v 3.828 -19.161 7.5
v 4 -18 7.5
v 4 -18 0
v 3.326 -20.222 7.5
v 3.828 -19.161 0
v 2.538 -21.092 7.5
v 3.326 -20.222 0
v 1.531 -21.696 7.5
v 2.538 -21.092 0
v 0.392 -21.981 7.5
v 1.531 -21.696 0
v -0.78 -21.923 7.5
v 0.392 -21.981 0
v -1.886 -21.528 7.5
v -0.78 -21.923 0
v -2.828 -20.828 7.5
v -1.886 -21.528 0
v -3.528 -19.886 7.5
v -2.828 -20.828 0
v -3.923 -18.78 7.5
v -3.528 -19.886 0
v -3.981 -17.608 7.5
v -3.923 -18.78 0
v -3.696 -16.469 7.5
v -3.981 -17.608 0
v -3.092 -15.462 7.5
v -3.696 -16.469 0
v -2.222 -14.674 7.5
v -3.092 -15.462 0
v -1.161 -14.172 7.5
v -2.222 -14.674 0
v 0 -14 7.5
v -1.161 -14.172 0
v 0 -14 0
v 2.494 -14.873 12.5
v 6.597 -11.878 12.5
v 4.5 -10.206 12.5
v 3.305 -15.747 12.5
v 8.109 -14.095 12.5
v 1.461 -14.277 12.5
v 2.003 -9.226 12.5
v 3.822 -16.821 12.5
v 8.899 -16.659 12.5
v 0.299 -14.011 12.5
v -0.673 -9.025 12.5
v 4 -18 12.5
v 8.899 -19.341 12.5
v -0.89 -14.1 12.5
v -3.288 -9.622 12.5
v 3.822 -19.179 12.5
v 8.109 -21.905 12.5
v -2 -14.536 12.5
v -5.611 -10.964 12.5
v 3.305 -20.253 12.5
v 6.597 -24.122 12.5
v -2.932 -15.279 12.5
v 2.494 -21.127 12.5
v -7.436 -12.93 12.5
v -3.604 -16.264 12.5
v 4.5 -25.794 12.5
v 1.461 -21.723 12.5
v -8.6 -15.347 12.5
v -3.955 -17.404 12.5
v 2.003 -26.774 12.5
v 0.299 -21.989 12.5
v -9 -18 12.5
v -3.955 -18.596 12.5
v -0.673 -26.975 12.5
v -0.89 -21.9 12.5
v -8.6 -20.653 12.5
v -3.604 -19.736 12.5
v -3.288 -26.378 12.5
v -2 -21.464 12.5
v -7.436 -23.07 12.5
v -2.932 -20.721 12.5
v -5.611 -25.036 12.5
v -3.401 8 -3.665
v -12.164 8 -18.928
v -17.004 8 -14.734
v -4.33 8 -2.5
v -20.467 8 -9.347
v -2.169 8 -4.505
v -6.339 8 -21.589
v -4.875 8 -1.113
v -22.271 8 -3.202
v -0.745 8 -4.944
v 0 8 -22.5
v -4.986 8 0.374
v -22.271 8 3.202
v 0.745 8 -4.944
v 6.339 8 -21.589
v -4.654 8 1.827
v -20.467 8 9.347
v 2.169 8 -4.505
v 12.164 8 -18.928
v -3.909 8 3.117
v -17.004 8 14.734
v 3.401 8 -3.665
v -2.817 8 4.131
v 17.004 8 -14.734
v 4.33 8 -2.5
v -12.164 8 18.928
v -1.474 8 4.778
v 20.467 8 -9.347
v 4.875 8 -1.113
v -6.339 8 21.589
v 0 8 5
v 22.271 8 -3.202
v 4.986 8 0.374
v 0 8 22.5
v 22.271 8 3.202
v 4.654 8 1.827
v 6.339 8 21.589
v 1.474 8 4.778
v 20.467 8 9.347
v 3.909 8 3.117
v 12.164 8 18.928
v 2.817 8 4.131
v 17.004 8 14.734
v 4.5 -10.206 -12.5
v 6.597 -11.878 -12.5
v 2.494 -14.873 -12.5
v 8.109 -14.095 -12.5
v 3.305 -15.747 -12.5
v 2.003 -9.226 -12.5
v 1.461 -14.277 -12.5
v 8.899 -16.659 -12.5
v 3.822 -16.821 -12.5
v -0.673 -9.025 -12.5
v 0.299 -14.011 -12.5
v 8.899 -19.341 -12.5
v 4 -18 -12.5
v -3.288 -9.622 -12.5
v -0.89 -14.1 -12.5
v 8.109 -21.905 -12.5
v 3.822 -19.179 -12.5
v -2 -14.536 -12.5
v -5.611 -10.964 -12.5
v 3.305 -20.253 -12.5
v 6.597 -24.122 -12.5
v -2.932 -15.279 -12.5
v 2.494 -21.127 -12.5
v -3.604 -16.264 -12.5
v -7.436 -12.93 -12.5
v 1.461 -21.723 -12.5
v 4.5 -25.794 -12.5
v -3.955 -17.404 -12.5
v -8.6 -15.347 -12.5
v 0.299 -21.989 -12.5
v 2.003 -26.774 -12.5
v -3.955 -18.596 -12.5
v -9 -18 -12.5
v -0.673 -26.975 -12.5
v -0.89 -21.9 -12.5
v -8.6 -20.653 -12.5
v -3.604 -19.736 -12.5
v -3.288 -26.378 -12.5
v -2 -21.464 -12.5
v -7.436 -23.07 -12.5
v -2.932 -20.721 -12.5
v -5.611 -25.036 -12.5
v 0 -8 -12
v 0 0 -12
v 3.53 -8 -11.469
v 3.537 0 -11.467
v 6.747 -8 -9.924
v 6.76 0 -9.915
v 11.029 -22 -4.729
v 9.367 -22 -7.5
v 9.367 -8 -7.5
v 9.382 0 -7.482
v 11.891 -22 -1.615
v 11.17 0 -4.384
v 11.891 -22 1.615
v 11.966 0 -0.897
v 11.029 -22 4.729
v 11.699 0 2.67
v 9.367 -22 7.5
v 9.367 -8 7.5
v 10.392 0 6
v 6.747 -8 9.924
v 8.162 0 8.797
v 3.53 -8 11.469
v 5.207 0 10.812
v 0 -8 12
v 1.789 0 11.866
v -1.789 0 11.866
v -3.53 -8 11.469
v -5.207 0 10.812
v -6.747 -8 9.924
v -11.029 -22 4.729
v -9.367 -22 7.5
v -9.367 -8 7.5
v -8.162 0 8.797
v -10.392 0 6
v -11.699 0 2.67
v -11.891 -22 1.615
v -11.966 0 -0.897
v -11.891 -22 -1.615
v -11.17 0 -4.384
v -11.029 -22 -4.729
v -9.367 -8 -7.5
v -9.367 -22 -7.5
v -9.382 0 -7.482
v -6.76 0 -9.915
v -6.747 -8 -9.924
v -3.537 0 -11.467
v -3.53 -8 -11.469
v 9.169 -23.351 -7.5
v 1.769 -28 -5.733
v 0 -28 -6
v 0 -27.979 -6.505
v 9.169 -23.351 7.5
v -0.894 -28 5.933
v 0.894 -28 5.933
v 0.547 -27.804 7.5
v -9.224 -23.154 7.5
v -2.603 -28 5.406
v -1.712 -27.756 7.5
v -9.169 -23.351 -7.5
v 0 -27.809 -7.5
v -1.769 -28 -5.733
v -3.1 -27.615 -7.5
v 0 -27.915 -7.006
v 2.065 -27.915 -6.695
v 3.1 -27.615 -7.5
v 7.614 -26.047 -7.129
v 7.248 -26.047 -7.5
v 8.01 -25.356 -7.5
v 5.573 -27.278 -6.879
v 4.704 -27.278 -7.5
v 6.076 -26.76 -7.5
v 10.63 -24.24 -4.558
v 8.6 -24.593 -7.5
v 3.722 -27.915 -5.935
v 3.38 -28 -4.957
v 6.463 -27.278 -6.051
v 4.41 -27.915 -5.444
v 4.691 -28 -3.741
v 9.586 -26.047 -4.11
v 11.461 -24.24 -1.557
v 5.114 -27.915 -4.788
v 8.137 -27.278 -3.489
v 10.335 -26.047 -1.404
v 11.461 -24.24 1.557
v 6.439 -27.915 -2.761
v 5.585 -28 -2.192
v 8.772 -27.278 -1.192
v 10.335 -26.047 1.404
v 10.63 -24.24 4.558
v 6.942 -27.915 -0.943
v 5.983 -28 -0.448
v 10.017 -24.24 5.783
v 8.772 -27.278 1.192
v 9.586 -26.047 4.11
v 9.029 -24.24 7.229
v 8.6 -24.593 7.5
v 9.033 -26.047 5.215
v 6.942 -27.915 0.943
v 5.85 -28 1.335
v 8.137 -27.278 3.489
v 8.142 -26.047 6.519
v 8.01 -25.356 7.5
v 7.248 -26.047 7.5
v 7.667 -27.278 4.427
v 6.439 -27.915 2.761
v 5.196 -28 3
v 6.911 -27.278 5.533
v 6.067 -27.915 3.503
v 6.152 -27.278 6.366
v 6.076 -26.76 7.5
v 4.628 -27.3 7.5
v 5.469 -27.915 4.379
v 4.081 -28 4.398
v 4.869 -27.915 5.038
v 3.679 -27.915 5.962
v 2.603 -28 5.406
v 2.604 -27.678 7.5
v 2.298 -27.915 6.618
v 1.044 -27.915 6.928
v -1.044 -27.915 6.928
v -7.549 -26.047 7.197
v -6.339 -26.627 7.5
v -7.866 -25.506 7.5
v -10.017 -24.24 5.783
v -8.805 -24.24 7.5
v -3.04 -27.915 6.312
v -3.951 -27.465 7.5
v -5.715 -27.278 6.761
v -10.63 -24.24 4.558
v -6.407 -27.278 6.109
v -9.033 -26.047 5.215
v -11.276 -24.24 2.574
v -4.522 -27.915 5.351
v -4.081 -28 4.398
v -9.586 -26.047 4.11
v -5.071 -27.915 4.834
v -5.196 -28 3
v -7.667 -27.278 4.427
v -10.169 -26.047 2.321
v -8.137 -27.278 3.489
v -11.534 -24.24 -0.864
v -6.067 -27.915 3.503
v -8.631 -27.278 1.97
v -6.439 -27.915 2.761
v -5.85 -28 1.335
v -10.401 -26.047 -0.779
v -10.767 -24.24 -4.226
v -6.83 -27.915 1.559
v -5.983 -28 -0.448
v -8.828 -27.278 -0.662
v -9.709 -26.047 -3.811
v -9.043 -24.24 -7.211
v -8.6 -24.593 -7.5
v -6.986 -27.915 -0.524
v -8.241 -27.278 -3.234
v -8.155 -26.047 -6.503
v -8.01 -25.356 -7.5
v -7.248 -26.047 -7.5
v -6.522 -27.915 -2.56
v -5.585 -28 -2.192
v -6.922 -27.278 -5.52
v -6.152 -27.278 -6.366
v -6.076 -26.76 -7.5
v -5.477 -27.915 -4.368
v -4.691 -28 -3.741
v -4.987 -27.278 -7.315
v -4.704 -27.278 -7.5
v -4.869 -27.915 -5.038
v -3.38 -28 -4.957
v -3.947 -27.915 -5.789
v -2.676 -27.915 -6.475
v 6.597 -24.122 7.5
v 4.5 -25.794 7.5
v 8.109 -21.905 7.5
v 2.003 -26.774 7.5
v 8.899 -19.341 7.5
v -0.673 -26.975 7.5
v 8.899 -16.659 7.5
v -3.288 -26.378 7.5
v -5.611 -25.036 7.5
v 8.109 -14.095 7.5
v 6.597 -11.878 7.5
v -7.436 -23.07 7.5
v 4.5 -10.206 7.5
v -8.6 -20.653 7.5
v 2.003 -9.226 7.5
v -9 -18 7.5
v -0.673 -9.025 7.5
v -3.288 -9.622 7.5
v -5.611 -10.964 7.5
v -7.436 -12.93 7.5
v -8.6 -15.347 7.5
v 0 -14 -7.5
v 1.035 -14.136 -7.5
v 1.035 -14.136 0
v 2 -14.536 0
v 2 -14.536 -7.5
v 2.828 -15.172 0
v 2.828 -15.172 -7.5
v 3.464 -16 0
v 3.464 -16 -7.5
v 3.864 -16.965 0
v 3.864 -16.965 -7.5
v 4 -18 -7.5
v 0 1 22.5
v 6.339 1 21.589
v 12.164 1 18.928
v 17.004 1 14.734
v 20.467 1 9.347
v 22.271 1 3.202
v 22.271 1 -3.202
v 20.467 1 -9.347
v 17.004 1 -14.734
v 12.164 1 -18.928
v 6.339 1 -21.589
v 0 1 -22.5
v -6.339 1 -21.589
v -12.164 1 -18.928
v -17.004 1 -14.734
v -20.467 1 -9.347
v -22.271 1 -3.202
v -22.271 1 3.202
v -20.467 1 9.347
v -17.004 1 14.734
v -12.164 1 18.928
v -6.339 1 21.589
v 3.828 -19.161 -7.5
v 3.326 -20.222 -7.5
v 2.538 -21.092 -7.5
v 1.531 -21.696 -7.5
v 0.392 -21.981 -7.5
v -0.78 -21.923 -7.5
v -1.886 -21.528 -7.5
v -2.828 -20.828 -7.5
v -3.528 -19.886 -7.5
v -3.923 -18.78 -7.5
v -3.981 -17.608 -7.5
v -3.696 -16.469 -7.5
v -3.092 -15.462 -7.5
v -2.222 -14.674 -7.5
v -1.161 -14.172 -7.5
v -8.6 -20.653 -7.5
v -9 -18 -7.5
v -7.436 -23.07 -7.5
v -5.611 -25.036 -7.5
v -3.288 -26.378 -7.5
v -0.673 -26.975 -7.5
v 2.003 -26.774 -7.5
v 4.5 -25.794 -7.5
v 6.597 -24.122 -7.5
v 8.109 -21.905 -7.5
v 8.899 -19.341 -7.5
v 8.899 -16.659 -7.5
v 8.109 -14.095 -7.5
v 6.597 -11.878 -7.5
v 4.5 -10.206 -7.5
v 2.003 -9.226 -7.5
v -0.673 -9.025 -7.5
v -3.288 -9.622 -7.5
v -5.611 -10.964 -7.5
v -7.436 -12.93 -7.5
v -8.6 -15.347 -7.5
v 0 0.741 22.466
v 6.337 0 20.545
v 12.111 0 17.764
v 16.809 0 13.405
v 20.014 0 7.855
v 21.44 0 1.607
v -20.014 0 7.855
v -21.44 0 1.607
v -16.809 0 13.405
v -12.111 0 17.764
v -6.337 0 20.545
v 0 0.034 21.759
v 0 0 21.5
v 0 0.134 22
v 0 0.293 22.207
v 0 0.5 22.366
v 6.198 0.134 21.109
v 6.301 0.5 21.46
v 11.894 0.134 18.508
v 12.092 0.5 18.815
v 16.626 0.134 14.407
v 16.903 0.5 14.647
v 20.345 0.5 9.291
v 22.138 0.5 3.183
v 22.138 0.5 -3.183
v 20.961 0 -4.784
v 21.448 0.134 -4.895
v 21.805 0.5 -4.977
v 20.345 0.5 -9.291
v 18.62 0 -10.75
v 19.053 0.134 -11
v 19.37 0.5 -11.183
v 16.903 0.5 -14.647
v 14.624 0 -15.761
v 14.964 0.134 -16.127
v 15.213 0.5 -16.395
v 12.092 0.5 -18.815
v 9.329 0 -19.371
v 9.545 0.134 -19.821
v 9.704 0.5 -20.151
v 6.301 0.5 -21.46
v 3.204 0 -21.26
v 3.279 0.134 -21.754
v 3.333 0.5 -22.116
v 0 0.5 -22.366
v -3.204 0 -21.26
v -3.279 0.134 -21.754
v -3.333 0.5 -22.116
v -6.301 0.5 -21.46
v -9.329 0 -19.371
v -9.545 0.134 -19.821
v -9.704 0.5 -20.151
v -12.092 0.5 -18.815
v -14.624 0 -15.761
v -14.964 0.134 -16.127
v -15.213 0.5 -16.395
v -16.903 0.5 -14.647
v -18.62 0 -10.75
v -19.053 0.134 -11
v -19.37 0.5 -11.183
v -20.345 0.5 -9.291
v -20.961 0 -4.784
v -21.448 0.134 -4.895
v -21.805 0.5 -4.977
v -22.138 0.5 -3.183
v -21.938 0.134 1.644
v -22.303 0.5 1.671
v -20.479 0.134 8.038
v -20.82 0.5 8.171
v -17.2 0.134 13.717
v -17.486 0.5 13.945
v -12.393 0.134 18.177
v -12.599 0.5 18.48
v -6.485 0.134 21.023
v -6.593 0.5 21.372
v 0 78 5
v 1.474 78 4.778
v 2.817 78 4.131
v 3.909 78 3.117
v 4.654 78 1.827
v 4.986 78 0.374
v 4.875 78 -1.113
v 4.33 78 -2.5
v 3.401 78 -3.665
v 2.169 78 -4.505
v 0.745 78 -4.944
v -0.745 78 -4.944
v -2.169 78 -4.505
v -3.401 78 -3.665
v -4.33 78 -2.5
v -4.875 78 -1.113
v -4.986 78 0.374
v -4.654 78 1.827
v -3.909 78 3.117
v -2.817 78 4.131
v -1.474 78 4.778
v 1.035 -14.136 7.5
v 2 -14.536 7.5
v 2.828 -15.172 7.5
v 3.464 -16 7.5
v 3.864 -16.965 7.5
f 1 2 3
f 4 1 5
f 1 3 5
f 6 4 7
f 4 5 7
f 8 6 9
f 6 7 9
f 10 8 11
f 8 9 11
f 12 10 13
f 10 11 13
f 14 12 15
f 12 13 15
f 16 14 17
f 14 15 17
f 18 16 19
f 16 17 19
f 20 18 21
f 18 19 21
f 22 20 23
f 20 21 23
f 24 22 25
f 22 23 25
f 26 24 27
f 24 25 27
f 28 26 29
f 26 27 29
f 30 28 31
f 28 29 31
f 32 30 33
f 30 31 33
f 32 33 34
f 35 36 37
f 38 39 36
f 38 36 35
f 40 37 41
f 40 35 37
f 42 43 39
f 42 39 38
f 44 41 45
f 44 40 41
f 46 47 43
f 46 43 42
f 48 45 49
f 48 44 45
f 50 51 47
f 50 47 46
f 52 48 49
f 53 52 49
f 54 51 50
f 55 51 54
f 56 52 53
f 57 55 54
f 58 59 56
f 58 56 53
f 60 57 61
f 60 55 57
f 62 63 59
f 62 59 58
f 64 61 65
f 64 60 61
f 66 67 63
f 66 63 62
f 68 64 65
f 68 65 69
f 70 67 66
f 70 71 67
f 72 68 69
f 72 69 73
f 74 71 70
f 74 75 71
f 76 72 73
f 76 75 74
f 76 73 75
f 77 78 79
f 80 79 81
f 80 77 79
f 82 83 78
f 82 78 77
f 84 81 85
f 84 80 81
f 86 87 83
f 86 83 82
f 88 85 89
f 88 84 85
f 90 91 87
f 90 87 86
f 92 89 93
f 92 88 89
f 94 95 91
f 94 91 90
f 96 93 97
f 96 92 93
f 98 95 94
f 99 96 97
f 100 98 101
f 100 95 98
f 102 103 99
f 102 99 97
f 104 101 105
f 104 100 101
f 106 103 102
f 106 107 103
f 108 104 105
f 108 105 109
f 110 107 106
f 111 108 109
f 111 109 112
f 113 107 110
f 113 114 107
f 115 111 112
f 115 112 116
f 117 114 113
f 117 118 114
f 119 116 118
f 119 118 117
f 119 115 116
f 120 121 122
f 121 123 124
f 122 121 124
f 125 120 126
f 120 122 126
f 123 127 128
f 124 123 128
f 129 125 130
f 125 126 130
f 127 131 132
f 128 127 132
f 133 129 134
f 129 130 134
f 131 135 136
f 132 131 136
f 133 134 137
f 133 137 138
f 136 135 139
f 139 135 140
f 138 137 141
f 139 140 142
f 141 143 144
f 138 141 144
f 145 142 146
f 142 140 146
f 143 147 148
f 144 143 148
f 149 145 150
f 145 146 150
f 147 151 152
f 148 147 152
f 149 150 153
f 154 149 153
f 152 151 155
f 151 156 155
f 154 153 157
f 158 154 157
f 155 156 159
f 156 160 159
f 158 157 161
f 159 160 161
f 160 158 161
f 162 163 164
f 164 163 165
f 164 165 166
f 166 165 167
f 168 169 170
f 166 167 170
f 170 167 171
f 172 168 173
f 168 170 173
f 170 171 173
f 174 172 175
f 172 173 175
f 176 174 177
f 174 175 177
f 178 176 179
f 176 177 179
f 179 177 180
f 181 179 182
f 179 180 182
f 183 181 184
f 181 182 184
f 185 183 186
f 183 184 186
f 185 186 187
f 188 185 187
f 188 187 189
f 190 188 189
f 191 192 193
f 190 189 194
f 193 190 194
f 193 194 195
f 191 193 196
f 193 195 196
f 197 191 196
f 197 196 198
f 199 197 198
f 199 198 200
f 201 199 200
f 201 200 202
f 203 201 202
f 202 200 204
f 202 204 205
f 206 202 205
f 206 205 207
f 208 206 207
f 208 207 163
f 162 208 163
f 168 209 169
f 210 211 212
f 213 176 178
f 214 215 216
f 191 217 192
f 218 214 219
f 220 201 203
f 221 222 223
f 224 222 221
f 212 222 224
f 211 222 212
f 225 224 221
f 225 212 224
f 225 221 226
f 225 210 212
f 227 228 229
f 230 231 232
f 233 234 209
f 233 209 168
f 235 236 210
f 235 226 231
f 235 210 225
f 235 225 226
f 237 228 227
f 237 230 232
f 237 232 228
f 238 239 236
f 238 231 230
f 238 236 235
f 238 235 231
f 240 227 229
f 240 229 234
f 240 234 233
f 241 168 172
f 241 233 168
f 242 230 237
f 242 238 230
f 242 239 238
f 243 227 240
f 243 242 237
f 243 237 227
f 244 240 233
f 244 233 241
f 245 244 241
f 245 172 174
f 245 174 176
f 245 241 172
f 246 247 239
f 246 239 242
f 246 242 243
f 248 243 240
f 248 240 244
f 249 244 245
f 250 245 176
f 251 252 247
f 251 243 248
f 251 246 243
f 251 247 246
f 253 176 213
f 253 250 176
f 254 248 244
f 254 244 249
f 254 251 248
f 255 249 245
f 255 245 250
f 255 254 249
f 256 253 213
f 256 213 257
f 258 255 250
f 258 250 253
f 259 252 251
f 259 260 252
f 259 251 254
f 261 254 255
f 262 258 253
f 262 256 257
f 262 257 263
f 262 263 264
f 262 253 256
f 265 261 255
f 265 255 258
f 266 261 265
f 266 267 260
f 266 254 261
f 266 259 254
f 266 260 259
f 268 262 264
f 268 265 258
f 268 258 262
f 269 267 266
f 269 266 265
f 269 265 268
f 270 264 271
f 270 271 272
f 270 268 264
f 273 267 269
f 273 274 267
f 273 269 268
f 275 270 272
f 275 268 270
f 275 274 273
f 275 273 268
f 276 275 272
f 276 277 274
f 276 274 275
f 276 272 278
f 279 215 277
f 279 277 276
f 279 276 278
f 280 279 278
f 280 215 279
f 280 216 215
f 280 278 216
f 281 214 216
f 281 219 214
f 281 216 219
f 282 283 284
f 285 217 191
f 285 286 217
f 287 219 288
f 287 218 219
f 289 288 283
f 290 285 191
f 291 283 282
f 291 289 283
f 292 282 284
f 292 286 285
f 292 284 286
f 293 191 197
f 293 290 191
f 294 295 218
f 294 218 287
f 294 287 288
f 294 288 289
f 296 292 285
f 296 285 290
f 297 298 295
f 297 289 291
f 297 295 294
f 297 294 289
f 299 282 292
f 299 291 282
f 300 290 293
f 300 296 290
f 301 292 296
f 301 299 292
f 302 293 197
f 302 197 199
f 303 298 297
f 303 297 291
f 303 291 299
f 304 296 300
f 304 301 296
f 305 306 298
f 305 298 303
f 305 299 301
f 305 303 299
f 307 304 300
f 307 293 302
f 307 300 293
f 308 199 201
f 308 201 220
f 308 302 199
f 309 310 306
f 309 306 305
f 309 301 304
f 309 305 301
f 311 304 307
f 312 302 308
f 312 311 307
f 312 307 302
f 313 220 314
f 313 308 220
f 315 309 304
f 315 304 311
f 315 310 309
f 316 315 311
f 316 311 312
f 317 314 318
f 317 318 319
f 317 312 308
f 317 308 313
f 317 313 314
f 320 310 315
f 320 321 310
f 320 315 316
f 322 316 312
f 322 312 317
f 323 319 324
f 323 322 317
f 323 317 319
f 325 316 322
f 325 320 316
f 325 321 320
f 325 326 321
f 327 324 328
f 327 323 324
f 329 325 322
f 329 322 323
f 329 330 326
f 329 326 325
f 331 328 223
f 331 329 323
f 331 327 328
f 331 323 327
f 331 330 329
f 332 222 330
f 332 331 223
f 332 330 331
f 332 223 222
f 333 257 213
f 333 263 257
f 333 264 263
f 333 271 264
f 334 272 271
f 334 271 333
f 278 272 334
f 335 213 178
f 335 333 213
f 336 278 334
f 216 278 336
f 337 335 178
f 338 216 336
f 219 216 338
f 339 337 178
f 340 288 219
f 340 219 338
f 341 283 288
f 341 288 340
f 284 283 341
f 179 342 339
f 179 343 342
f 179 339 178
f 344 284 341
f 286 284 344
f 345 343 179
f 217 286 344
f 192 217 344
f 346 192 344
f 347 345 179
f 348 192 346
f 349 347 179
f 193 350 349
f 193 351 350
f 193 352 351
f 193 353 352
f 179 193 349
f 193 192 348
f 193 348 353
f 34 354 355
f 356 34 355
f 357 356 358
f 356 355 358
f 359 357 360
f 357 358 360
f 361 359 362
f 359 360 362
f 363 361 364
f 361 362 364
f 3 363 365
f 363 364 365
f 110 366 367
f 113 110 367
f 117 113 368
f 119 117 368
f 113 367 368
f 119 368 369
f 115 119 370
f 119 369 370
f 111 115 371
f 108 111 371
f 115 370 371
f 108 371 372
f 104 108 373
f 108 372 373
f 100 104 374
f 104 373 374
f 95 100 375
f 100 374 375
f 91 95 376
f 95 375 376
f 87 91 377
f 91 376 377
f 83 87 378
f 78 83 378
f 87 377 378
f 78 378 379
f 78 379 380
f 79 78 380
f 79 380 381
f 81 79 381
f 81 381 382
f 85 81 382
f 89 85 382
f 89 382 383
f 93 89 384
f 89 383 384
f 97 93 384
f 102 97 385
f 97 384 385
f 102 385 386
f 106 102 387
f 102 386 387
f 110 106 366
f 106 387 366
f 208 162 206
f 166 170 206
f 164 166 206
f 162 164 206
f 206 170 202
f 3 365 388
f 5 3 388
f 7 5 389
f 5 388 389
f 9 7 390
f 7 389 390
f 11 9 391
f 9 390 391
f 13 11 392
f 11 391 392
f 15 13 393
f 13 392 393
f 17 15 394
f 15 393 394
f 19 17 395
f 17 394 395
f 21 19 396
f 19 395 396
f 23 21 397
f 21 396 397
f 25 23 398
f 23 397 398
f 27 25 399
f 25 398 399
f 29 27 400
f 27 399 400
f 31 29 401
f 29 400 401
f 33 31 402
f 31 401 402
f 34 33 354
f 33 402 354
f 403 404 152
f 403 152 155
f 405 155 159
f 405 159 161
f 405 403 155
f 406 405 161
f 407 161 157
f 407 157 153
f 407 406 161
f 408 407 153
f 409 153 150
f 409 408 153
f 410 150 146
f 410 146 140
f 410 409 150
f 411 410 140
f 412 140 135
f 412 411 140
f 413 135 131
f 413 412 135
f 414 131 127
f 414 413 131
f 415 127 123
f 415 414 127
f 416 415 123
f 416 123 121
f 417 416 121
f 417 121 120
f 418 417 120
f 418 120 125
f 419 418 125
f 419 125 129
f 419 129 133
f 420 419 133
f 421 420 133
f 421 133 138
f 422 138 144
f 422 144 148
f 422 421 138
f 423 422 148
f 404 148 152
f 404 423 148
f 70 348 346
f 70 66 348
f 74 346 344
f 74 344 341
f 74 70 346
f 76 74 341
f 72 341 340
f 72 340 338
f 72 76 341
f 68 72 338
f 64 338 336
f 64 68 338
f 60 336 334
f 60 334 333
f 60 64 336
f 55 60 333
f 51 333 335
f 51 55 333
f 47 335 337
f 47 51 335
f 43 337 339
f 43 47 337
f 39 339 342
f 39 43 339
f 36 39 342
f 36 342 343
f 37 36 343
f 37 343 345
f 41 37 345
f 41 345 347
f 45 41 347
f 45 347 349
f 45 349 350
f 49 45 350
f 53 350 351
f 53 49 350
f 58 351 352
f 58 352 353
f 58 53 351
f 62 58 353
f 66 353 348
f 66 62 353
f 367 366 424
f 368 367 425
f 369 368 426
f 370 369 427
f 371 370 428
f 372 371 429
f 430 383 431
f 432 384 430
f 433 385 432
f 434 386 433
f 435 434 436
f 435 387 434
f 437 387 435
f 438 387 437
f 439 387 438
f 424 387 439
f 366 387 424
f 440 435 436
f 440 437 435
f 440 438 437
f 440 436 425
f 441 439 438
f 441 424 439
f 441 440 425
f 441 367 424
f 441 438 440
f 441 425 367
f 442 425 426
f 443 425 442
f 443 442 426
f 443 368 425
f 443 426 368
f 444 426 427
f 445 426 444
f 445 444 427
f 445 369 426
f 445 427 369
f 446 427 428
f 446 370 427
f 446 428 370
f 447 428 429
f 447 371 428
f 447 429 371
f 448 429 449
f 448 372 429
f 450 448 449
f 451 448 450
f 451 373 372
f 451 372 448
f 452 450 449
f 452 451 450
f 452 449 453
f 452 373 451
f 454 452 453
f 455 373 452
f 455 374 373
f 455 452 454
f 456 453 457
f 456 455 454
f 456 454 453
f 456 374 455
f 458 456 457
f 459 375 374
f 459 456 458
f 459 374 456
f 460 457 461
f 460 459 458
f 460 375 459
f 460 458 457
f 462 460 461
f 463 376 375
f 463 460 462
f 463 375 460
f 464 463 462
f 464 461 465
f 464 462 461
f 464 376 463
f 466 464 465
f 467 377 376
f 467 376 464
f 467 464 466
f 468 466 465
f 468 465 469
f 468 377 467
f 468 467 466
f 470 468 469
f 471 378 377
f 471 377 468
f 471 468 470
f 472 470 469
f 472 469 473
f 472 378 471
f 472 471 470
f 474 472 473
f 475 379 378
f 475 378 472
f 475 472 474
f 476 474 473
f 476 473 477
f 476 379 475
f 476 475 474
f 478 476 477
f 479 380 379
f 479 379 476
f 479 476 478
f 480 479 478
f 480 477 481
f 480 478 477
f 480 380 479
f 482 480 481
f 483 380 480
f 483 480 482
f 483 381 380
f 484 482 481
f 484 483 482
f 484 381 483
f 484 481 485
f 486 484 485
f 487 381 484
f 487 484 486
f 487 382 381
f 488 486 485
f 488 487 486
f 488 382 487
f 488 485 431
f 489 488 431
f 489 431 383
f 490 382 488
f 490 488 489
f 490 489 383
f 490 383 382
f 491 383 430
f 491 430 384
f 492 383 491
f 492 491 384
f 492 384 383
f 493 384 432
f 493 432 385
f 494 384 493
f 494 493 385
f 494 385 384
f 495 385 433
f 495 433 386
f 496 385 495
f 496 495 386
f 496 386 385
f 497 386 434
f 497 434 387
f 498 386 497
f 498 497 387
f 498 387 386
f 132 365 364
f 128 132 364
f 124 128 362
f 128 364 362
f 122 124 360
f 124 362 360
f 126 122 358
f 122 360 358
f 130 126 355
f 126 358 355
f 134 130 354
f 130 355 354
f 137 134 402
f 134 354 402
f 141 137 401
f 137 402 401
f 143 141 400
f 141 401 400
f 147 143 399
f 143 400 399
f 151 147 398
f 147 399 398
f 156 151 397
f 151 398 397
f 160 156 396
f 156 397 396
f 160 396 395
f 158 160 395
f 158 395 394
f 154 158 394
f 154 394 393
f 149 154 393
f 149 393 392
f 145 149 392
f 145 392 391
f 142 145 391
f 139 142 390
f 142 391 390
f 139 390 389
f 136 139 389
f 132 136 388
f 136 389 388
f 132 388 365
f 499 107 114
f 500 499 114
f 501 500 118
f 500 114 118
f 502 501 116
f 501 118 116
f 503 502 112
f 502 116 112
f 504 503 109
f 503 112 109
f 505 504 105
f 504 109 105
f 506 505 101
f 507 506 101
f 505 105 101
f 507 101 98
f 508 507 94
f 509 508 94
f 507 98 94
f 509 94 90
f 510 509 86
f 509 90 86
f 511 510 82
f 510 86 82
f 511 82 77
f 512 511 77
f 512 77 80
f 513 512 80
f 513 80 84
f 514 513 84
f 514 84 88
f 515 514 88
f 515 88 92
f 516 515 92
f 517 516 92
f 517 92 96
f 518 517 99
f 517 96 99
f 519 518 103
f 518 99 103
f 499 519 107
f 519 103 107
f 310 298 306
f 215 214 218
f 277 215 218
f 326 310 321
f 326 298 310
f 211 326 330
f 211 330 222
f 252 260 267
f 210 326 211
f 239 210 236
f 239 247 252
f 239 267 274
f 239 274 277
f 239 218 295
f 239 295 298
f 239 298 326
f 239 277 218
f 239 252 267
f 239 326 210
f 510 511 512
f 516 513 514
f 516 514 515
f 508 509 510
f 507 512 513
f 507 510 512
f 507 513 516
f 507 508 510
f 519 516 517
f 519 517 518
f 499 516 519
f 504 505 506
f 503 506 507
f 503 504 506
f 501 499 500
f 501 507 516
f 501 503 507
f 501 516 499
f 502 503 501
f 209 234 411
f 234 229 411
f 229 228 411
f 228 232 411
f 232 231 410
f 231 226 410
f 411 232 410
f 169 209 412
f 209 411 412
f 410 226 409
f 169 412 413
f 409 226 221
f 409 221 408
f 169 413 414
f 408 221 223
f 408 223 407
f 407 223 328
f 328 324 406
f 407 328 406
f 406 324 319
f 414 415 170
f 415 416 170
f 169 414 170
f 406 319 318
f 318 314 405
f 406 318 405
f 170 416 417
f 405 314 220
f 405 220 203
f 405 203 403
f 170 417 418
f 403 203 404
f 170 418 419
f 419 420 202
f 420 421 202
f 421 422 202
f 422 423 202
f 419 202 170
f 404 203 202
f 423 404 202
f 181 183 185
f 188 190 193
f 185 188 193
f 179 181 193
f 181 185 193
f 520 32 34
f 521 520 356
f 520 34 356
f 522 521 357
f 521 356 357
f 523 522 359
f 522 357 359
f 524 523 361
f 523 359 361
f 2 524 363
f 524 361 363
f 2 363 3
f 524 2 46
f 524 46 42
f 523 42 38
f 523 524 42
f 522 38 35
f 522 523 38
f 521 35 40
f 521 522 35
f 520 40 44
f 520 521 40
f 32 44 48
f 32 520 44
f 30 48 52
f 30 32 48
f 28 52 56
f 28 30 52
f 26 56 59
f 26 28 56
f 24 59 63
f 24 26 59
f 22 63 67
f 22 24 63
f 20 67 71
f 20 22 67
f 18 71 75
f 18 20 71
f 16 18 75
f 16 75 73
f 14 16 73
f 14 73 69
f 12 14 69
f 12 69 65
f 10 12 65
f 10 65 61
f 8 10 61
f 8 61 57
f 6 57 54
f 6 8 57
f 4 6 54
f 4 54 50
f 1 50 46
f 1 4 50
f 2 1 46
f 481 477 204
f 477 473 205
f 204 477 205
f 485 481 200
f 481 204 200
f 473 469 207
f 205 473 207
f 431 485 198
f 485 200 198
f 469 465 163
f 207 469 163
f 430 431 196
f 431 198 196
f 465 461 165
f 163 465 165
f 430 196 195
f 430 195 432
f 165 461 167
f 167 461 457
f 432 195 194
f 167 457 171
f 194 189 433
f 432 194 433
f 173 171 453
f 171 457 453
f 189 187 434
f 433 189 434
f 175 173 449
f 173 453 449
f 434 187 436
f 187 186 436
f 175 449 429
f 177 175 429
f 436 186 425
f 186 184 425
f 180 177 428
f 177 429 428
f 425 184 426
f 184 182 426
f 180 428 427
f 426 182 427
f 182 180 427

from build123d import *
from build123d.topology import SkipClean

# Parameters (mm, degrees)
SKETCH2_R               = 22.5
BOSS_EXTRUDE1_DEPTH     = 8
SKETCH3_R               = 5
BOSS_EXTRUDE2_DEPTH     = 70
SKETCH4_R               = 12
BOSS_EXTRUDE3_DEPTH     = 28
FILLET1_R               = 6
CUT_EXTRUDE1_DEPTH      = 85.240726493
CUT_EXTRUDE1_DEPTH_BACK = 85.240726493
SKETCH5_W               = 15
SKETCH5_H               = 20
SKETCH6_R               = 4
CUT_EXTRUDE2_DEPTH      = 28
SKETCH7_R               = 9
SKETCH7_R_2             = 4
BOSS_EXTRUDE5_DEPTH     = 12.5
FILLET3_R               = 1


with BuildPart() as part:
    # Sketch2 → Boss-Extrude1 (new body)
    with BuildSketch(Plane(origin=(0, 0, 0), x_dir=(1, 0, 0), z_dir=(0, 1, 0))):
        Circle(SKETCH2_R)
    extrude(amount=BOSS_EXTRUDE1_DEPTH)

    # Sketch3 → Boss-Extrude2 (add)
    with BuildSketch(Plane(origin=(0, 8, 0), x_dir=(1, 0, 0), z_dir=(0, 1, 0))):
        Circle(SKETCH3_R)
    extrude(amount=BOSS_EXTRUDE2_DEPTH)

    # Sketch4 → Boss-Extrude3 (add)
    with BuildSketch(Plane.XZ):
        Circle(SKETCH4_R)
    extrude(amount=BOSS_EXTRUDE3_DEPTH)

    # Fillet1
    fillet1_edges = [part.edges().sort_by_distance(p)[0] for p in [
        (-12, -28, 0),
    ]]
    fillet(fillet1_edges, radius=FILLET1_R)

    # Sketch5 → Cut-Extrude1 (cut, two sides: drawn at the far end of the back side and taken through both)
    with BuildSketch(Plane(origin=(0, 0, 0), x_dir=(0, 0, -1), z_dir=(1, 0, 0)).offset(-CUT_EXTRUDE1_DEPTH_BACK)):
        with Locations((15, -18)):
            Rectangle(SKETCH5_W, SKETCH5_H)
        with Locations((-15, -18)):
            Rectangle(SKETCH5_W, SKETCH5_H)
    extrude(amount=CUT_EXTRUDE1_DEPTH + CUT_EXTRUDE1_DEPTH_BACK, mode=Mode.SUBTRACT)

    # Sketch6 → Cut-Extrude2 (cut)
    with BuildSketch(Plane(origin=(0, 0, -7.5), x_dir=(-1, 0, 0), z_dir=(0, 0, -1))):
        with Locations((0, -18)):
            Circle(SKETCH6_R)
    extrude(amount=-CUT_EXTRUDE2_DEPTH, mode=Mode.SUBTRACT)

    # Sketch7 → Boss-Extrude5 (add, symmetric)
    with SkipClean():  # the faces are left unmerged after this step: merging them gives an invalid solid
        with BuildSketch(Plane.XY):
            with Locations((0, -18)):
                Circle(SKETCH7_R)
            with Locations((0, -18)):
                Circle(SKETCH7_R_2, mode=Mode.SUBTRACT)
        extrude(amount=BOSS_EXTRUDE5_DEPTH, both=True)
    add(part.part.scale(1), mode=Mode.REPLACE)  # the faces are merged on a copy

    # Fillet3
    fillet3_edges = [part.edges().sort_by_distance(p)[0] for p in [
        (-22.5, 0, 0),
    ]]
    fillet(fillet3_edges, radius=FILLET3_R)


solid = part.part
